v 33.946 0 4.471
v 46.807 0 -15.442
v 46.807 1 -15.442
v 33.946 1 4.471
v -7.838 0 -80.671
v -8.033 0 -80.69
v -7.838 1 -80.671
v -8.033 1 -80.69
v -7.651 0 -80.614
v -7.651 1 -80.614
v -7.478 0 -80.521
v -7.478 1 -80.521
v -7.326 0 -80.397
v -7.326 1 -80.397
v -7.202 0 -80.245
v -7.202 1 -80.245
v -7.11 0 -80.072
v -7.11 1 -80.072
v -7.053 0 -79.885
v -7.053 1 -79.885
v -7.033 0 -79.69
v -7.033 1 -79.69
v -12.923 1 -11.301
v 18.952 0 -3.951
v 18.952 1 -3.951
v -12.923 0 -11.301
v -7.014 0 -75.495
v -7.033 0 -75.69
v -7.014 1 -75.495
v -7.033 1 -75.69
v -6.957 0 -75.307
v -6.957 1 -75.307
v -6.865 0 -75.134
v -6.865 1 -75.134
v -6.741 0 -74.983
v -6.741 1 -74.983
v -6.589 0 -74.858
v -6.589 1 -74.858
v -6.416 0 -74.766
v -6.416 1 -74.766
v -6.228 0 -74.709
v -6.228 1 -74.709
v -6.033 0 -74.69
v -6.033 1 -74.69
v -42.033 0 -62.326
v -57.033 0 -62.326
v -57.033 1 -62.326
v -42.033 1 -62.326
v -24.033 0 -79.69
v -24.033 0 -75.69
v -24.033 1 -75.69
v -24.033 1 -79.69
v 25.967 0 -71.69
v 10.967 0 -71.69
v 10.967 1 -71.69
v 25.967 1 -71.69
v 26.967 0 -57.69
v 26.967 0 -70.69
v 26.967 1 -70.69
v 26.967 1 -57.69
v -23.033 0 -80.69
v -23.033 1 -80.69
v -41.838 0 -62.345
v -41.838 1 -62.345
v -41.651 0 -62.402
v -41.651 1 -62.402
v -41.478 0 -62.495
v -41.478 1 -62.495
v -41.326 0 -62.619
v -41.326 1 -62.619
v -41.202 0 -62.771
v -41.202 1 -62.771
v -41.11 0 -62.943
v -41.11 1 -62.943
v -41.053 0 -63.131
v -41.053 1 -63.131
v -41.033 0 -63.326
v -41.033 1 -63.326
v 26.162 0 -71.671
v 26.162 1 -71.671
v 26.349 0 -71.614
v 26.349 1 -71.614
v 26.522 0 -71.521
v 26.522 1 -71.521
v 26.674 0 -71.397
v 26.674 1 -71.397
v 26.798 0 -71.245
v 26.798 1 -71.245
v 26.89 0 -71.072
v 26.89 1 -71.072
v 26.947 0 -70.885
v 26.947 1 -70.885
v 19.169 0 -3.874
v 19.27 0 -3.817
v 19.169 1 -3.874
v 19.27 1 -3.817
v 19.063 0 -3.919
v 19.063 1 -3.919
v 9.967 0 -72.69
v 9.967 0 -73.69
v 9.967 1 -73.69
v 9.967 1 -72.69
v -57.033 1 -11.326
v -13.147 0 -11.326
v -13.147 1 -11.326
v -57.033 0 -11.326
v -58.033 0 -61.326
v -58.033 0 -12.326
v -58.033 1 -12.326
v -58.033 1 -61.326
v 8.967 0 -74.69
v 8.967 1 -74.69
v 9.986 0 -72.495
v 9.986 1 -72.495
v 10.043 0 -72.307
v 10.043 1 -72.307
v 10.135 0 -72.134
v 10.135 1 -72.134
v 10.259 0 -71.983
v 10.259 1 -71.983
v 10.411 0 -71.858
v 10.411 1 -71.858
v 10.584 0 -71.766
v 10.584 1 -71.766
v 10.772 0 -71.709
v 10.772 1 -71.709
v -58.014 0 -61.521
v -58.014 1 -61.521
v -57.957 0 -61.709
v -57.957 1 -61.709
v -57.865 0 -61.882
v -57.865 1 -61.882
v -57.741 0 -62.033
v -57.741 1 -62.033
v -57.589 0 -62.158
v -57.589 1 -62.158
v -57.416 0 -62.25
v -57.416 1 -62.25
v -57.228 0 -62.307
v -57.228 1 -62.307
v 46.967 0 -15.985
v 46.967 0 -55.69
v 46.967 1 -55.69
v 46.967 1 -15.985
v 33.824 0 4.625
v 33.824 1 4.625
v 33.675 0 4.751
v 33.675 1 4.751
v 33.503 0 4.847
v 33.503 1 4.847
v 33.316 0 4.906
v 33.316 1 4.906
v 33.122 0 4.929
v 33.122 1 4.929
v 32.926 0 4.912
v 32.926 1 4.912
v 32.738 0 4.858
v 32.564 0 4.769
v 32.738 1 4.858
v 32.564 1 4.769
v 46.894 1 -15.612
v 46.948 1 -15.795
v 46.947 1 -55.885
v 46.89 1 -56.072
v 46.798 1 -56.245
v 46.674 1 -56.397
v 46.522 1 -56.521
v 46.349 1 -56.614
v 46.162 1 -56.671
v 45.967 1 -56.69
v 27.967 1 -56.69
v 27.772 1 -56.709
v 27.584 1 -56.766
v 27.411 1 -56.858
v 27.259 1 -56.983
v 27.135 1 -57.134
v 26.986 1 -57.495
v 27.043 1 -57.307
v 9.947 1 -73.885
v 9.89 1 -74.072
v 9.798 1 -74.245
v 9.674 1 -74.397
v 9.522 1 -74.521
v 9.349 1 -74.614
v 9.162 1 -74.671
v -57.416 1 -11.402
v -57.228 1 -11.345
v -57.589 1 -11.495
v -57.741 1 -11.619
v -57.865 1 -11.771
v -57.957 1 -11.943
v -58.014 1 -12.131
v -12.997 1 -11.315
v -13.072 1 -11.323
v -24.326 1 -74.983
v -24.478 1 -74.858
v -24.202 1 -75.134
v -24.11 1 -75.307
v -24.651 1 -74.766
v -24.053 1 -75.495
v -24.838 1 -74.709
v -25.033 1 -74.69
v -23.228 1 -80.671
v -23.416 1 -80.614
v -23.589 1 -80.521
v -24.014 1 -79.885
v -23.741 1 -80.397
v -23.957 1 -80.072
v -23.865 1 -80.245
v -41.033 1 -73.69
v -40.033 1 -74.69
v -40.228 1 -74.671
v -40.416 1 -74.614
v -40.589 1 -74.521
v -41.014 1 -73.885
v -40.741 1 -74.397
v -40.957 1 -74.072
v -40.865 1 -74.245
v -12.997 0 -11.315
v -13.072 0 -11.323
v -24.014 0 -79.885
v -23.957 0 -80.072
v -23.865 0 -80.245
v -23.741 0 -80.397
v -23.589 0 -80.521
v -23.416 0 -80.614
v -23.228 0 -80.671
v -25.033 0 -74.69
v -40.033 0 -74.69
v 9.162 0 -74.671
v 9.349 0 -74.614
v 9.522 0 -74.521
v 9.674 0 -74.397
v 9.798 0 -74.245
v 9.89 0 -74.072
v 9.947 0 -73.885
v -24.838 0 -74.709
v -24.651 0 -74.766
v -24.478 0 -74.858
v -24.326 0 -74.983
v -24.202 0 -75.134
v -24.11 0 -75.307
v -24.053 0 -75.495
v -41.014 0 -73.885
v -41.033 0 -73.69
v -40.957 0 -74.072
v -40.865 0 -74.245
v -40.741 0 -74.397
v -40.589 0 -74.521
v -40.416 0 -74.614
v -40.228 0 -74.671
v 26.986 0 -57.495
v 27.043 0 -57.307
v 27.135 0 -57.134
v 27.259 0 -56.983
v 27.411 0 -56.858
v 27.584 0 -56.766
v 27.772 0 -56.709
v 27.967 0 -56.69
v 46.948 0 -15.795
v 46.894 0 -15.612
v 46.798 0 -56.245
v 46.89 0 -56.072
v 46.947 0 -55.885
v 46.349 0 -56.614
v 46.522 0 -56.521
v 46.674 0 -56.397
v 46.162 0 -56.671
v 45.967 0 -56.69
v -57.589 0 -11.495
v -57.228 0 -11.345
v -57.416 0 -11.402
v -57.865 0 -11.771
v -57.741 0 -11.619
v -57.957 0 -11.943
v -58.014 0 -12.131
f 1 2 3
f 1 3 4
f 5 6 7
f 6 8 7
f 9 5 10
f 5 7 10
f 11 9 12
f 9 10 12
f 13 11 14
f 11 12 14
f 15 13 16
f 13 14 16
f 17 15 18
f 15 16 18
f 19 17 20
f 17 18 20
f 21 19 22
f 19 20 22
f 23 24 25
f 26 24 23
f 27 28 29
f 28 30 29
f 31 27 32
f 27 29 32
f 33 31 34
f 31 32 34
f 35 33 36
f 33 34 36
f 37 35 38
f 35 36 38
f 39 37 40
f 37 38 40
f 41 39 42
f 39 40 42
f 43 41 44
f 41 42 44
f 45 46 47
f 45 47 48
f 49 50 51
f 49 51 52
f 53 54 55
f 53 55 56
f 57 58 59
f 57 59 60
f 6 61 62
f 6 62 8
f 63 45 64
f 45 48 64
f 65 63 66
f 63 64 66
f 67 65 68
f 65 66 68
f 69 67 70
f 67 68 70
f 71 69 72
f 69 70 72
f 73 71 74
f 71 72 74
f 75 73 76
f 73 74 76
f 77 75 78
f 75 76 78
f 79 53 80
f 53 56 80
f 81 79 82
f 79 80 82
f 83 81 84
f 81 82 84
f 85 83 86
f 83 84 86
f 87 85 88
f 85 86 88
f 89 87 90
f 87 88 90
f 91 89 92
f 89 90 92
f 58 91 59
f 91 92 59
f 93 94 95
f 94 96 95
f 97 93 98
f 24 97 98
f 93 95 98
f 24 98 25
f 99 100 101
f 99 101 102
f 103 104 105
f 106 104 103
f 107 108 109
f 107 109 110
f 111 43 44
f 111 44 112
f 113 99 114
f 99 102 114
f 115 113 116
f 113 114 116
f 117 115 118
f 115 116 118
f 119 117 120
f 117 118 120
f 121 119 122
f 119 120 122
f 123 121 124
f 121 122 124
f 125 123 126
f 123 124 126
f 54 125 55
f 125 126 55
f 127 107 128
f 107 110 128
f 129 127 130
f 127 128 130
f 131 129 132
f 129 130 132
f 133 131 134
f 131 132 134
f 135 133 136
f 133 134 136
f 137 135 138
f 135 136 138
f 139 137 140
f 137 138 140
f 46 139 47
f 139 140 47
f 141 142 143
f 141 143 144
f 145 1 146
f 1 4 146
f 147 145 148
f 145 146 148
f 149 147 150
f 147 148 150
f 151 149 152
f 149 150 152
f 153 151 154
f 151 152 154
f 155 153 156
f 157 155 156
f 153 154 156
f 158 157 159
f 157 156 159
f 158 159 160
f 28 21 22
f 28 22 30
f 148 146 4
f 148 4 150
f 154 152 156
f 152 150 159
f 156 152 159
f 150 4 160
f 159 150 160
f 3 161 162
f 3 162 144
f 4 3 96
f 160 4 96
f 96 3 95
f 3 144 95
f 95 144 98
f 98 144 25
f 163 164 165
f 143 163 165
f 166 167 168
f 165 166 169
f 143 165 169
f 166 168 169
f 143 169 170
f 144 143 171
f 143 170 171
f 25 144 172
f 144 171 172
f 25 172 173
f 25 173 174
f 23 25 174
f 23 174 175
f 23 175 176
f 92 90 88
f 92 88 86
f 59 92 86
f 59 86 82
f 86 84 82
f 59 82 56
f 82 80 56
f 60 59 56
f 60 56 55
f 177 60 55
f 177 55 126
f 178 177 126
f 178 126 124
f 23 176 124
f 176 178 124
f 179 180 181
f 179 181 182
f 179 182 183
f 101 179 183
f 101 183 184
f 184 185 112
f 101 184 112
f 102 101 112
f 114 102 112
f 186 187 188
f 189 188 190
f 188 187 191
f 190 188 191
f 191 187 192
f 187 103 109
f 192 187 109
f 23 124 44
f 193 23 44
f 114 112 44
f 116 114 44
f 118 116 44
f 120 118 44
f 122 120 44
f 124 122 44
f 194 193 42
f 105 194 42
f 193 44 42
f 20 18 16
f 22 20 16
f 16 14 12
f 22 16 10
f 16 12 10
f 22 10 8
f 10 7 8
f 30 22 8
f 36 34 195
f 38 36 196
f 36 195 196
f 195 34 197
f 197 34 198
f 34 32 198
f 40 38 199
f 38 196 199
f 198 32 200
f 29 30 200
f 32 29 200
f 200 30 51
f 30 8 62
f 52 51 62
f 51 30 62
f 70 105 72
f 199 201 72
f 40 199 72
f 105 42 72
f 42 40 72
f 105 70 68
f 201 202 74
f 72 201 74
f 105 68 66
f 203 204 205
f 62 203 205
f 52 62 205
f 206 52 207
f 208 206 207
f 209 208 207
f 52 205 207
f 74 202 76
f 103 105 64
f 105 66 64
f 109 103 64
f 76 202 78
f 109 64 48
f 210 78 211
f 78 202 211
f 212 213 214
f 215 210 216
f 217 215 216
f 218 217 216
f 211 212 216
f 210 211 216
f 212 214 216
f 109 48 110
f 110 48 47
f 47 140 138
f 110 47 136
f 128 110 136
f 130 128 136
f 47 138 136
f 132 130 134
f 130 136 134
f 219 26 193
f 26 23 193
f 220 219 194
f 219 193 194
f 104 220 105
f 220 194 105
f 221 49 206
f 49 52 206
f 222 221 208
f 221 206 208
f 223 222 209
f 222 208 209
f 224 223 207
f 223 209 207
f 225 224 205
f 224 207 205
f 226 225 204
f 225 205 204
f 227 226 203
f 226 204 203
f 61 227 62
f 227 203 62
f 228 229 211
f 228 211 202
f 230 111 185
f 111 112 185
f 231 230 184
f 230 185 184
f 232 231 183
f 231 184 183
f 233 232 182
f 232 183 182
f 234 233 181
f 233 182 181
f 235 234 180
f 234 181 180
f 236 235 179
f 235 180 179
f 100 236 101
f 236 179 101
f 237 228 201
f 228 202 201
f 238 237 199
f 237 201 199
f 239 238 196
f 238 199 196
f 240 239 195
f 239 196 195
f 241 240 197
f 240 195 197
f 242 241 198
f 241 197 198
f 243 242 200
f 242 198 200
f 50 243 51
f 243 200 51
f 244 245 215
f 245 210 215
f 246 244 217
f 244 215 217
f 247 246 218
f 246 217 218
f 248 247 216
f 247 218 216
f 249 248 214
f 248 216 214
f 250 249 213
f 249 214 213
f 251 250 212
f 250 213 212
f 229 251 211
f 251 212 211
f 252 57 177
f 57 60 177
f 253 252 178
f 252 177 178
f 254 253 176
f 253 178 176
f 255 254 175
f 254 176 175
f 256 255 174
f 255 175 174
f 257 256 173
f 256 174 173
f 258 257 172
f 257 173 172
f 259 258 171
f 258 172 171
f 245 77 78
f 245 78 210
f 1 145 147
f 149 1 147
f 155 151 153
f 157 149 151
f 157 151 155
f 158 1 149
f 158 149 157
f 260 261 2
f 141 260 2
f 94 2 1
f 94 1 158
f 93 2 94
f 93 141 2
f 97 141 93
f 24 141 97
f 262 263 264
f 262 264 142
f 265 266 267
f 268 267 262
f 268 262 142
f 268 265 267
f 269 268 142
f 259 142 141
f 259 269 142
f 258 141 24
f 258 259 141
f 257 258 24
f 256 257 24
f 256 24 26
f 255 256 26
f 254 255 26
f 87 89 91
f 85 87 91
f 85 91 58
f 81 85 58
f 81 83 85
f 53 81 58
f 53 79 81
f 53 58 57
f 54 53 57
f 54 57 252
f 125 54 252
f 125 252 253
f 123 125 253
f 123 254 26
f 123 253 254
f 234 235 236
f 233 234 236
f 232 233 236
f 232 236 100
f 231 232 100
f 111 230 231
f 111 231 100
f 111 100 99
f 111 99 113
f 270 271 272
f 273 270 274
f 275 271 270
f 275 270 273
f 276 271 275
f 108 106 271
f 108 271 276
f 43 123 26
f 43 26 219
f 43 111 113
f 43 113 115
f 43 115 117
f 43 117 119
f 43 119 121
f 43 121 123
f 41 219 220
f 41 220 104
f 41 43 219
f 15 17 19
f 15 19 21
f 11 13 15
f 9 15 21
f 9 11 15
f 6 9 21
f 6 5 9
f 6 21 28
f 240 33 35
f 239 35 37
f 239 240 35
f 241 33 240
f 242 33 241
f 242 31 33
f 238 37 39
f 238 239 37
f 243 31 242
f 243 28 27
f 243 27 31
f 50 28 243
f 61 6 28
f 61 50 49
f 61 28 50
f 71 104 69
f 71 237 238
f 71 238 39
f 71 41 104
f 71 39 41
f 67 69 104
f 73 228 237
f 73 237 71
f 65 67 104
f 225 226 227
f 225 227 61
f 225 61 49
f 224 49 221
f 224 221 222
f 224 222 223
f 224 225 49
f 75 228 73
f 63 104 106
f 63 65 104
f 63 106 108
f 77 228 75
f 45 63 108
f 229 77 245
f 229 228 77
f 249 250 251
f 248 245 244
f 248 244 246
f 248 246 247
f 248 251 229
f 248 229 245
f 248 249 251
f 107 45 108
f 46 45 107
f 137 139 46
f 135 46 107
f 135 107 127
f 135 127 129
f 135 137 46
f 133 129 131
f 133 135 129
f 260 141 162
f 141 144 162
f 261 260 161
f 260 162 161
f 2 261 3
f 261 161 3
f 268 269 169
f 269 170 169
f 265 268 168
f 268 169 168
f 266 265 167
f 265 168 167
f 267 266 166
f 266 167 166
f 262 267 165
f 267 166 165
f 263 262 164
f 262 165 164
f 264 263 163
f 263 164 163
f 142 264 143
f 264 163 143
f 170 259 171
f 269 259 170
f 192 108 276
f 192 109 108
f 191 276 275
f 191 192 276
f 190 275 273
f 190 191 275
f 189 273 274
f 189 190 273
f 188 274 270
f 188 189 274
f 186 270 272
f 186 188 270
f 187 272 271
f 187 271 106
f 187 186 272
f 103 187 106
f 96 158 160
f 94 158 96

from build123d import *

# Parameters (mm, degrees)
RESSALTO_EXTRUS_O1_DEPTH = 1
FILETE1_R                = 1


with BuildPart() as part:
    # Esboço1 → Ressalto-extrusão1 (new body)
    with BuildSketch(Plane(origin=(0, 0, 0), x_dir=(1, 0, 0), z_dir=(0, 1, 0))):
        Polygon((-58.0333979, 11.326122728), (-58.0333979, 62.326122728), (-41.0333979, 62.326122728), (-41.0333979, 74.689759091), (-24.0333979, 74.689759091), (-24.0333979, 80.689759091), (-7.0333979, 80.689759091), (-7.0333979, 74.689759091), (9.9666021, 74.689759091), (9.9666021, 71.689759091), (26.9666021, 71.689759091), (26.9666021, 56.689759091), (46.9666021, 56.689759091), (46.9666021, 15.689759091), (33.403566363, -5.311289968), (19.122853002, 3.911574333), (-13.0333979, 11.326122728), align=None)
    extrude(amount=RESSALTO_EXTRUS_O1_DEPTH)

    # Filete1
    filete1_edges = [part.edges().sort_by_distance(p)[0] for p in [
        (-58.0333979, 0.5, -11.326122728),
        (-58.0333979, 0.5, -62.326122728),
        (-41.0333979, 0.5, -62.326122728),
        (-41.0333979, 0.5, -74.689759091),
        (-24.0333979, 0.5, -74.689759091),
        (-24.0333979, 0.5, -80.689759091),
        (-7.0333979, 0.5, -80.689759091),
        (-7.0333979, 0.5, -74.689759091),
        (9.9666021, 0.5, -74.689759091),
        (9.9666021, 0.5, -71.689759091),
        (26.9666021, 0.5, -71.689759091),
        (26.9666021, 0.5, -56.689759091),
        (46.9666021, 0.5, -56.689759091),
        (46.9666021, 0.5, -15.689759091),
        (33.403566363, 0.5, 5.311289968),
        (19.122853002, 0.5, -3.911574333),
        (-13.0333979, 0.5, -11.326122728),
    ]]
    fillet(filete1_edges, radius=FILETE1_R)


solid = part.part
